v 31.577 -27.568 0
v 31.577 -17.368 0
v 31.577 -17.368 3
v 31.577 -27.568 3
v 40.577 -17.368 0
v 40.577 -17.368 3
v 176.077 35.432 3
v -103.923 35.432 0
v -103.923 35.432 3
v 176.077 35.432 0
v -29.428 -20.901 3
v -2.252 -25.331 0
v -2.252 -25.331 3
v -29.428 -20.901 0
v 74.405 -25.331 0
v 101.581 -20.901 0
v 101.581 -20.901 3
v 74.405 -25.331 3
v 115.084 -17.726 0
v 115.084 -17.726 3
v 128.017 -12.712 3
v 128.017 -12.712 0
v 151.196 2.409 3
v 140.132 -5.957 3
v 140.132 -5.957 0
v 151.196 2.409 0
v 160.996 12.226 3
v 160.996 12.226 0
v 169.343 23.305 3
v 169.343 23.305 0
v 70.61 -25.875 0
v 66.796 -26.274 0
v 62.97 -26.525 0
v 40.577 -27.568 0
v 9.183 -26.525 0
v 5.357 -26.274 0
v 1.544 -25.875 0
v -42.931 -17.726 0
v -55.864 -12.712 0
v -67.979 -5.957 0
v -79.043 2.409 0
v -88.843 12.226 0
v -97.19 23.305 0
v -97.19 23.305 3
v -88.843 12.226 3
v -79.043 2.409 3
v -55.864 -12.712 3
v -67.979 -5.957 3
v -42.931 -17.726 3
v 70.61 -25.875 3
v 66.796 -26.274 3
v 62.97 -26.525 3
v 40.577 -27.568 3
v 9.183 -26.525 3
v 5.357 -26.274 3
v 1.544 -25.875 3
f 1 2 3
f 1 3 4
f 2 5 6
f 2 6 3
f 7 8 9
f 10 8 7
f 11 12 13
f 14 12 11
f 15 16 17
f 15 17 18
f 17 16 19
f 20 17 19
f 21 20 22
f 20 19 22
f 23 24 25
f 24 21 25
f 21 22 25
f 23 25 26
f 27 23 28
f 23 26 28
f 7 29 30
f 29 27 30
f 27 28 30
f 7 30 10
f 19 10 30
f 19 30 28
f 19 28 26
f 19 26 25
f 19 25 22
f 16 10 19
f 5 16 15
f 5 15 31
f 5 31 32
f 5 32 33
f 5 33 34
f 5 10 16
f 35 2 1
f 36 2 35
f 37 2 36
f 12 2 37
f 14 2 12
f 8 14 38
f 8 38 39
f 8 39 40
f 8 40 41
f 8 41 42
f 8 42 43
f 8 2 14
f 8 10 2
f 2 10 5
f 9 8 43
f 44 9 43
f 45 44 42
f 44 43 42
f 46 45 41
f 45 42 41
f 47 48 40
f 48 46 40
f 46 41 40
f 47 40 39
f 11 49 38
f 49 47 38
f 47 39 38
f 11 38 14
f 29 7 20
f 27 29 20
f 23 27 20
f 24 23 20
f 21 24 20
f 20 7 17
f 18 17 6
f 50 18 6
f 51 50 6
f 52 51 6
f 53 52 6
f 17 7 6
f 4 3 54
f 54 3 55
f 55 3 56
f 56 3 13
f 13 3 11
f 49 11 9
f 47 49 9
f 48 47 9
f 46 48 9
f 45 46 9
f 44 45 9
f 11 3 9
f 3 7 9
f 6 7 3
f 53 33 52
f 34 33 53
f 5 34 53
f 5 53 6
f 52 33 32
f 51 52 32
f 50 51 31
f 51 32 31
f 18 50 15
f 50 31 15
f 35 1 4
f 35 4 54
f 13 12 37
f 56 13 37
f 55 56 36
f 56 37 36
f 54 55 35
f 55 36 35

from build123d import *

# Parameters (mm, degrees)
BOSS_EXTRU_1_DEPTH = 3
CONG_1_R           = 100


with BuildPart() as part:
    # Esquisse1 → Boss.-Extru.1 (new body)
    with BuildSketch(Plane.XY):
        Polygon((-103.923413348, 35.431604979), (176.076586652, 35.431604979), (166.152848879, -10.376473534), (68.721994761, -26.257415358), (40.576586652, -27.568395021), (40.576586652, -17.368395021), (31.576586652, -17.368395021), (31.576586652, -27.568395021), (3.431178543, -26.257415358), (-93.999675575, -10.376473534), align=None)
    extrude(amount=BOSS_EXTRU_1_DEPTH)

    # Congé1
    # the kernel refuses this fillet: 100 mm, written as the material it takes off along each edge
    with BuildSketch(Plane(origin=(166.152848879, -10.376473534, -163.559702543), x_dir=(0.21172591921769693, 0.9773290823112863, 0), z_dir=(0, 0, 1))) as cong_1_piece_1:
        with BuildLine():
            CenterArc((69.095913034, 97.498917991), CONG_1_R, 201.481144987, 55.677497197)
            Line((-23.957899624, 60.879415675), (-25.818975877, 60.147025629))
            Line((-25.818975877, 60.147025629), (-1.861076253, -0.732390046))
            Line((-1.861076253, -0.732390046), (0, -2))
            ThreePointArc((0, -2), (23.435339919, -2), (46.426175173, -1.94997836))
            Line((46.426175173, -1.94997836), (46.870679837, 0))
        make_face()
    extrude(amount=330.119405086, mode=Mode.SUBTRACT)
    with BuildSketch(Plane(origin=(68.721994761, -26.257415358, -14.394746153), x_dir=(0.9869749511957248, 0.16087400570694135, 0), z_dir=(0, 0, 1)), Plane(origin=(3.431178543, -26.257415358, -14.394746153), x_dir=(0.9989169691295284, -0.04652836538152723, 0), z_dir=(0, 0, 1))) as cong_1_piece_2:
        with BuildLine():
            CenterArc((CONG_1_R * 0.057578984614, CONG_1_R), CONG_1_R, 263.409211525, 6.590788475)
            Line((-CONG_1_R * 0.0571984584269, CONG_1_R * 0.00660876862688), (-CONG_1_R * 0.0594940072877, -CONG_1_R * 0.0132590560006))
            Line((-CONG_1_R * 0.0594940072877, -CONG_1_R * 0.0132590560006), (-CONG_1_R * 0.00115157969228, -CONG_1_R * 0.02))
            Line((-CONG_1_R * 0.00115157969228, -CONG_1_R * 0.02), (CONG_1_R * 0.057578984614, -CONG_1_R * 0.02))
            Line((CONG_1_R * 0.057578984614, -CONG_1_R * 0.02), (CONG_1_R * 0.057578984614, 0))
        make_face()
    extrude(amount=31.789492307, mode=Mode.SUBTRACT)
    with BuildSketch(Plane(origin=(-93.999675575, -10.376473534, -163.559702543), x_dir=(0.9869749511957245, -0.1608740057069428, 0), z_dir=(0, 0, 1))) as cong_1_piece_3:
        with BuildLine():
            CenterArc((65.423881017, 100), CONG_1_R, 214.322502803, 55.677497197)
            Line((-17.163809688, 43.614954607), (-18.815563502, 42.487253699))
            ThreePointArc((-18.815563502, 42.487253699), (-10.442981097, 21.075087257), (-1.861076253, -0.732390046))
            Line((-1.861076253, -0.732390046), (0, -2))
            Line((0, -2), (65.423881017, -2))
            Line((65.423881017, -2), (65.423881017, 0))
        make_face()
    extrude(amount=330.119405086, mode=Mode.SUBTRACT)


solid = part.part
